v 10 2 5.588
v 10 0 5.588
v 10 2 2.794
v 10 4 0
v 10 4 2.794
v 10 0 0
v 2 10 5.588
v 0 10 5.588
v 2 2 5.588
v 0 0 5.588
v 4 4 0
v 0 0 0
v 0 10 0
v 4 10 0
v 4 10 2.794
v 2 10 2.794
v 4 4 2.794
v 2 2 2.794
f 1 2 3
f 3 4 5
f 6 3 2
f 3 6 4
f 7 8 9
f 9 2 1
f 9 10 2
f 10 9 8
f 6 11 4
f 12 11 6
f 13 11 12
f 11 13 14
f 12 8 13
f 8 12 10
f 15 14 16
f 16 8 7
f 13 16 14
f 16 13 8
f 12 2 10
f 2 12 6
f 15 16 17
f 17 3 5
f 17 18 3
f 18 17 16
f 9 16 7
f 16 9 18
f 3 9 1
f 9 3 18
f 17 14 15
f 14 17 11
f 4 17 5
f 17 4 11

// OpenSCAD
in=25.4;

difference() {
    cube([10,10,in/10*2*1.1]);
    translate([2,2,in/10*1.1]) {
        cube([8,8,in/10*1.1]);
    }
    translate([4,4,0]) {
        cube([6,6,in/10*1.1]);
    }
}
